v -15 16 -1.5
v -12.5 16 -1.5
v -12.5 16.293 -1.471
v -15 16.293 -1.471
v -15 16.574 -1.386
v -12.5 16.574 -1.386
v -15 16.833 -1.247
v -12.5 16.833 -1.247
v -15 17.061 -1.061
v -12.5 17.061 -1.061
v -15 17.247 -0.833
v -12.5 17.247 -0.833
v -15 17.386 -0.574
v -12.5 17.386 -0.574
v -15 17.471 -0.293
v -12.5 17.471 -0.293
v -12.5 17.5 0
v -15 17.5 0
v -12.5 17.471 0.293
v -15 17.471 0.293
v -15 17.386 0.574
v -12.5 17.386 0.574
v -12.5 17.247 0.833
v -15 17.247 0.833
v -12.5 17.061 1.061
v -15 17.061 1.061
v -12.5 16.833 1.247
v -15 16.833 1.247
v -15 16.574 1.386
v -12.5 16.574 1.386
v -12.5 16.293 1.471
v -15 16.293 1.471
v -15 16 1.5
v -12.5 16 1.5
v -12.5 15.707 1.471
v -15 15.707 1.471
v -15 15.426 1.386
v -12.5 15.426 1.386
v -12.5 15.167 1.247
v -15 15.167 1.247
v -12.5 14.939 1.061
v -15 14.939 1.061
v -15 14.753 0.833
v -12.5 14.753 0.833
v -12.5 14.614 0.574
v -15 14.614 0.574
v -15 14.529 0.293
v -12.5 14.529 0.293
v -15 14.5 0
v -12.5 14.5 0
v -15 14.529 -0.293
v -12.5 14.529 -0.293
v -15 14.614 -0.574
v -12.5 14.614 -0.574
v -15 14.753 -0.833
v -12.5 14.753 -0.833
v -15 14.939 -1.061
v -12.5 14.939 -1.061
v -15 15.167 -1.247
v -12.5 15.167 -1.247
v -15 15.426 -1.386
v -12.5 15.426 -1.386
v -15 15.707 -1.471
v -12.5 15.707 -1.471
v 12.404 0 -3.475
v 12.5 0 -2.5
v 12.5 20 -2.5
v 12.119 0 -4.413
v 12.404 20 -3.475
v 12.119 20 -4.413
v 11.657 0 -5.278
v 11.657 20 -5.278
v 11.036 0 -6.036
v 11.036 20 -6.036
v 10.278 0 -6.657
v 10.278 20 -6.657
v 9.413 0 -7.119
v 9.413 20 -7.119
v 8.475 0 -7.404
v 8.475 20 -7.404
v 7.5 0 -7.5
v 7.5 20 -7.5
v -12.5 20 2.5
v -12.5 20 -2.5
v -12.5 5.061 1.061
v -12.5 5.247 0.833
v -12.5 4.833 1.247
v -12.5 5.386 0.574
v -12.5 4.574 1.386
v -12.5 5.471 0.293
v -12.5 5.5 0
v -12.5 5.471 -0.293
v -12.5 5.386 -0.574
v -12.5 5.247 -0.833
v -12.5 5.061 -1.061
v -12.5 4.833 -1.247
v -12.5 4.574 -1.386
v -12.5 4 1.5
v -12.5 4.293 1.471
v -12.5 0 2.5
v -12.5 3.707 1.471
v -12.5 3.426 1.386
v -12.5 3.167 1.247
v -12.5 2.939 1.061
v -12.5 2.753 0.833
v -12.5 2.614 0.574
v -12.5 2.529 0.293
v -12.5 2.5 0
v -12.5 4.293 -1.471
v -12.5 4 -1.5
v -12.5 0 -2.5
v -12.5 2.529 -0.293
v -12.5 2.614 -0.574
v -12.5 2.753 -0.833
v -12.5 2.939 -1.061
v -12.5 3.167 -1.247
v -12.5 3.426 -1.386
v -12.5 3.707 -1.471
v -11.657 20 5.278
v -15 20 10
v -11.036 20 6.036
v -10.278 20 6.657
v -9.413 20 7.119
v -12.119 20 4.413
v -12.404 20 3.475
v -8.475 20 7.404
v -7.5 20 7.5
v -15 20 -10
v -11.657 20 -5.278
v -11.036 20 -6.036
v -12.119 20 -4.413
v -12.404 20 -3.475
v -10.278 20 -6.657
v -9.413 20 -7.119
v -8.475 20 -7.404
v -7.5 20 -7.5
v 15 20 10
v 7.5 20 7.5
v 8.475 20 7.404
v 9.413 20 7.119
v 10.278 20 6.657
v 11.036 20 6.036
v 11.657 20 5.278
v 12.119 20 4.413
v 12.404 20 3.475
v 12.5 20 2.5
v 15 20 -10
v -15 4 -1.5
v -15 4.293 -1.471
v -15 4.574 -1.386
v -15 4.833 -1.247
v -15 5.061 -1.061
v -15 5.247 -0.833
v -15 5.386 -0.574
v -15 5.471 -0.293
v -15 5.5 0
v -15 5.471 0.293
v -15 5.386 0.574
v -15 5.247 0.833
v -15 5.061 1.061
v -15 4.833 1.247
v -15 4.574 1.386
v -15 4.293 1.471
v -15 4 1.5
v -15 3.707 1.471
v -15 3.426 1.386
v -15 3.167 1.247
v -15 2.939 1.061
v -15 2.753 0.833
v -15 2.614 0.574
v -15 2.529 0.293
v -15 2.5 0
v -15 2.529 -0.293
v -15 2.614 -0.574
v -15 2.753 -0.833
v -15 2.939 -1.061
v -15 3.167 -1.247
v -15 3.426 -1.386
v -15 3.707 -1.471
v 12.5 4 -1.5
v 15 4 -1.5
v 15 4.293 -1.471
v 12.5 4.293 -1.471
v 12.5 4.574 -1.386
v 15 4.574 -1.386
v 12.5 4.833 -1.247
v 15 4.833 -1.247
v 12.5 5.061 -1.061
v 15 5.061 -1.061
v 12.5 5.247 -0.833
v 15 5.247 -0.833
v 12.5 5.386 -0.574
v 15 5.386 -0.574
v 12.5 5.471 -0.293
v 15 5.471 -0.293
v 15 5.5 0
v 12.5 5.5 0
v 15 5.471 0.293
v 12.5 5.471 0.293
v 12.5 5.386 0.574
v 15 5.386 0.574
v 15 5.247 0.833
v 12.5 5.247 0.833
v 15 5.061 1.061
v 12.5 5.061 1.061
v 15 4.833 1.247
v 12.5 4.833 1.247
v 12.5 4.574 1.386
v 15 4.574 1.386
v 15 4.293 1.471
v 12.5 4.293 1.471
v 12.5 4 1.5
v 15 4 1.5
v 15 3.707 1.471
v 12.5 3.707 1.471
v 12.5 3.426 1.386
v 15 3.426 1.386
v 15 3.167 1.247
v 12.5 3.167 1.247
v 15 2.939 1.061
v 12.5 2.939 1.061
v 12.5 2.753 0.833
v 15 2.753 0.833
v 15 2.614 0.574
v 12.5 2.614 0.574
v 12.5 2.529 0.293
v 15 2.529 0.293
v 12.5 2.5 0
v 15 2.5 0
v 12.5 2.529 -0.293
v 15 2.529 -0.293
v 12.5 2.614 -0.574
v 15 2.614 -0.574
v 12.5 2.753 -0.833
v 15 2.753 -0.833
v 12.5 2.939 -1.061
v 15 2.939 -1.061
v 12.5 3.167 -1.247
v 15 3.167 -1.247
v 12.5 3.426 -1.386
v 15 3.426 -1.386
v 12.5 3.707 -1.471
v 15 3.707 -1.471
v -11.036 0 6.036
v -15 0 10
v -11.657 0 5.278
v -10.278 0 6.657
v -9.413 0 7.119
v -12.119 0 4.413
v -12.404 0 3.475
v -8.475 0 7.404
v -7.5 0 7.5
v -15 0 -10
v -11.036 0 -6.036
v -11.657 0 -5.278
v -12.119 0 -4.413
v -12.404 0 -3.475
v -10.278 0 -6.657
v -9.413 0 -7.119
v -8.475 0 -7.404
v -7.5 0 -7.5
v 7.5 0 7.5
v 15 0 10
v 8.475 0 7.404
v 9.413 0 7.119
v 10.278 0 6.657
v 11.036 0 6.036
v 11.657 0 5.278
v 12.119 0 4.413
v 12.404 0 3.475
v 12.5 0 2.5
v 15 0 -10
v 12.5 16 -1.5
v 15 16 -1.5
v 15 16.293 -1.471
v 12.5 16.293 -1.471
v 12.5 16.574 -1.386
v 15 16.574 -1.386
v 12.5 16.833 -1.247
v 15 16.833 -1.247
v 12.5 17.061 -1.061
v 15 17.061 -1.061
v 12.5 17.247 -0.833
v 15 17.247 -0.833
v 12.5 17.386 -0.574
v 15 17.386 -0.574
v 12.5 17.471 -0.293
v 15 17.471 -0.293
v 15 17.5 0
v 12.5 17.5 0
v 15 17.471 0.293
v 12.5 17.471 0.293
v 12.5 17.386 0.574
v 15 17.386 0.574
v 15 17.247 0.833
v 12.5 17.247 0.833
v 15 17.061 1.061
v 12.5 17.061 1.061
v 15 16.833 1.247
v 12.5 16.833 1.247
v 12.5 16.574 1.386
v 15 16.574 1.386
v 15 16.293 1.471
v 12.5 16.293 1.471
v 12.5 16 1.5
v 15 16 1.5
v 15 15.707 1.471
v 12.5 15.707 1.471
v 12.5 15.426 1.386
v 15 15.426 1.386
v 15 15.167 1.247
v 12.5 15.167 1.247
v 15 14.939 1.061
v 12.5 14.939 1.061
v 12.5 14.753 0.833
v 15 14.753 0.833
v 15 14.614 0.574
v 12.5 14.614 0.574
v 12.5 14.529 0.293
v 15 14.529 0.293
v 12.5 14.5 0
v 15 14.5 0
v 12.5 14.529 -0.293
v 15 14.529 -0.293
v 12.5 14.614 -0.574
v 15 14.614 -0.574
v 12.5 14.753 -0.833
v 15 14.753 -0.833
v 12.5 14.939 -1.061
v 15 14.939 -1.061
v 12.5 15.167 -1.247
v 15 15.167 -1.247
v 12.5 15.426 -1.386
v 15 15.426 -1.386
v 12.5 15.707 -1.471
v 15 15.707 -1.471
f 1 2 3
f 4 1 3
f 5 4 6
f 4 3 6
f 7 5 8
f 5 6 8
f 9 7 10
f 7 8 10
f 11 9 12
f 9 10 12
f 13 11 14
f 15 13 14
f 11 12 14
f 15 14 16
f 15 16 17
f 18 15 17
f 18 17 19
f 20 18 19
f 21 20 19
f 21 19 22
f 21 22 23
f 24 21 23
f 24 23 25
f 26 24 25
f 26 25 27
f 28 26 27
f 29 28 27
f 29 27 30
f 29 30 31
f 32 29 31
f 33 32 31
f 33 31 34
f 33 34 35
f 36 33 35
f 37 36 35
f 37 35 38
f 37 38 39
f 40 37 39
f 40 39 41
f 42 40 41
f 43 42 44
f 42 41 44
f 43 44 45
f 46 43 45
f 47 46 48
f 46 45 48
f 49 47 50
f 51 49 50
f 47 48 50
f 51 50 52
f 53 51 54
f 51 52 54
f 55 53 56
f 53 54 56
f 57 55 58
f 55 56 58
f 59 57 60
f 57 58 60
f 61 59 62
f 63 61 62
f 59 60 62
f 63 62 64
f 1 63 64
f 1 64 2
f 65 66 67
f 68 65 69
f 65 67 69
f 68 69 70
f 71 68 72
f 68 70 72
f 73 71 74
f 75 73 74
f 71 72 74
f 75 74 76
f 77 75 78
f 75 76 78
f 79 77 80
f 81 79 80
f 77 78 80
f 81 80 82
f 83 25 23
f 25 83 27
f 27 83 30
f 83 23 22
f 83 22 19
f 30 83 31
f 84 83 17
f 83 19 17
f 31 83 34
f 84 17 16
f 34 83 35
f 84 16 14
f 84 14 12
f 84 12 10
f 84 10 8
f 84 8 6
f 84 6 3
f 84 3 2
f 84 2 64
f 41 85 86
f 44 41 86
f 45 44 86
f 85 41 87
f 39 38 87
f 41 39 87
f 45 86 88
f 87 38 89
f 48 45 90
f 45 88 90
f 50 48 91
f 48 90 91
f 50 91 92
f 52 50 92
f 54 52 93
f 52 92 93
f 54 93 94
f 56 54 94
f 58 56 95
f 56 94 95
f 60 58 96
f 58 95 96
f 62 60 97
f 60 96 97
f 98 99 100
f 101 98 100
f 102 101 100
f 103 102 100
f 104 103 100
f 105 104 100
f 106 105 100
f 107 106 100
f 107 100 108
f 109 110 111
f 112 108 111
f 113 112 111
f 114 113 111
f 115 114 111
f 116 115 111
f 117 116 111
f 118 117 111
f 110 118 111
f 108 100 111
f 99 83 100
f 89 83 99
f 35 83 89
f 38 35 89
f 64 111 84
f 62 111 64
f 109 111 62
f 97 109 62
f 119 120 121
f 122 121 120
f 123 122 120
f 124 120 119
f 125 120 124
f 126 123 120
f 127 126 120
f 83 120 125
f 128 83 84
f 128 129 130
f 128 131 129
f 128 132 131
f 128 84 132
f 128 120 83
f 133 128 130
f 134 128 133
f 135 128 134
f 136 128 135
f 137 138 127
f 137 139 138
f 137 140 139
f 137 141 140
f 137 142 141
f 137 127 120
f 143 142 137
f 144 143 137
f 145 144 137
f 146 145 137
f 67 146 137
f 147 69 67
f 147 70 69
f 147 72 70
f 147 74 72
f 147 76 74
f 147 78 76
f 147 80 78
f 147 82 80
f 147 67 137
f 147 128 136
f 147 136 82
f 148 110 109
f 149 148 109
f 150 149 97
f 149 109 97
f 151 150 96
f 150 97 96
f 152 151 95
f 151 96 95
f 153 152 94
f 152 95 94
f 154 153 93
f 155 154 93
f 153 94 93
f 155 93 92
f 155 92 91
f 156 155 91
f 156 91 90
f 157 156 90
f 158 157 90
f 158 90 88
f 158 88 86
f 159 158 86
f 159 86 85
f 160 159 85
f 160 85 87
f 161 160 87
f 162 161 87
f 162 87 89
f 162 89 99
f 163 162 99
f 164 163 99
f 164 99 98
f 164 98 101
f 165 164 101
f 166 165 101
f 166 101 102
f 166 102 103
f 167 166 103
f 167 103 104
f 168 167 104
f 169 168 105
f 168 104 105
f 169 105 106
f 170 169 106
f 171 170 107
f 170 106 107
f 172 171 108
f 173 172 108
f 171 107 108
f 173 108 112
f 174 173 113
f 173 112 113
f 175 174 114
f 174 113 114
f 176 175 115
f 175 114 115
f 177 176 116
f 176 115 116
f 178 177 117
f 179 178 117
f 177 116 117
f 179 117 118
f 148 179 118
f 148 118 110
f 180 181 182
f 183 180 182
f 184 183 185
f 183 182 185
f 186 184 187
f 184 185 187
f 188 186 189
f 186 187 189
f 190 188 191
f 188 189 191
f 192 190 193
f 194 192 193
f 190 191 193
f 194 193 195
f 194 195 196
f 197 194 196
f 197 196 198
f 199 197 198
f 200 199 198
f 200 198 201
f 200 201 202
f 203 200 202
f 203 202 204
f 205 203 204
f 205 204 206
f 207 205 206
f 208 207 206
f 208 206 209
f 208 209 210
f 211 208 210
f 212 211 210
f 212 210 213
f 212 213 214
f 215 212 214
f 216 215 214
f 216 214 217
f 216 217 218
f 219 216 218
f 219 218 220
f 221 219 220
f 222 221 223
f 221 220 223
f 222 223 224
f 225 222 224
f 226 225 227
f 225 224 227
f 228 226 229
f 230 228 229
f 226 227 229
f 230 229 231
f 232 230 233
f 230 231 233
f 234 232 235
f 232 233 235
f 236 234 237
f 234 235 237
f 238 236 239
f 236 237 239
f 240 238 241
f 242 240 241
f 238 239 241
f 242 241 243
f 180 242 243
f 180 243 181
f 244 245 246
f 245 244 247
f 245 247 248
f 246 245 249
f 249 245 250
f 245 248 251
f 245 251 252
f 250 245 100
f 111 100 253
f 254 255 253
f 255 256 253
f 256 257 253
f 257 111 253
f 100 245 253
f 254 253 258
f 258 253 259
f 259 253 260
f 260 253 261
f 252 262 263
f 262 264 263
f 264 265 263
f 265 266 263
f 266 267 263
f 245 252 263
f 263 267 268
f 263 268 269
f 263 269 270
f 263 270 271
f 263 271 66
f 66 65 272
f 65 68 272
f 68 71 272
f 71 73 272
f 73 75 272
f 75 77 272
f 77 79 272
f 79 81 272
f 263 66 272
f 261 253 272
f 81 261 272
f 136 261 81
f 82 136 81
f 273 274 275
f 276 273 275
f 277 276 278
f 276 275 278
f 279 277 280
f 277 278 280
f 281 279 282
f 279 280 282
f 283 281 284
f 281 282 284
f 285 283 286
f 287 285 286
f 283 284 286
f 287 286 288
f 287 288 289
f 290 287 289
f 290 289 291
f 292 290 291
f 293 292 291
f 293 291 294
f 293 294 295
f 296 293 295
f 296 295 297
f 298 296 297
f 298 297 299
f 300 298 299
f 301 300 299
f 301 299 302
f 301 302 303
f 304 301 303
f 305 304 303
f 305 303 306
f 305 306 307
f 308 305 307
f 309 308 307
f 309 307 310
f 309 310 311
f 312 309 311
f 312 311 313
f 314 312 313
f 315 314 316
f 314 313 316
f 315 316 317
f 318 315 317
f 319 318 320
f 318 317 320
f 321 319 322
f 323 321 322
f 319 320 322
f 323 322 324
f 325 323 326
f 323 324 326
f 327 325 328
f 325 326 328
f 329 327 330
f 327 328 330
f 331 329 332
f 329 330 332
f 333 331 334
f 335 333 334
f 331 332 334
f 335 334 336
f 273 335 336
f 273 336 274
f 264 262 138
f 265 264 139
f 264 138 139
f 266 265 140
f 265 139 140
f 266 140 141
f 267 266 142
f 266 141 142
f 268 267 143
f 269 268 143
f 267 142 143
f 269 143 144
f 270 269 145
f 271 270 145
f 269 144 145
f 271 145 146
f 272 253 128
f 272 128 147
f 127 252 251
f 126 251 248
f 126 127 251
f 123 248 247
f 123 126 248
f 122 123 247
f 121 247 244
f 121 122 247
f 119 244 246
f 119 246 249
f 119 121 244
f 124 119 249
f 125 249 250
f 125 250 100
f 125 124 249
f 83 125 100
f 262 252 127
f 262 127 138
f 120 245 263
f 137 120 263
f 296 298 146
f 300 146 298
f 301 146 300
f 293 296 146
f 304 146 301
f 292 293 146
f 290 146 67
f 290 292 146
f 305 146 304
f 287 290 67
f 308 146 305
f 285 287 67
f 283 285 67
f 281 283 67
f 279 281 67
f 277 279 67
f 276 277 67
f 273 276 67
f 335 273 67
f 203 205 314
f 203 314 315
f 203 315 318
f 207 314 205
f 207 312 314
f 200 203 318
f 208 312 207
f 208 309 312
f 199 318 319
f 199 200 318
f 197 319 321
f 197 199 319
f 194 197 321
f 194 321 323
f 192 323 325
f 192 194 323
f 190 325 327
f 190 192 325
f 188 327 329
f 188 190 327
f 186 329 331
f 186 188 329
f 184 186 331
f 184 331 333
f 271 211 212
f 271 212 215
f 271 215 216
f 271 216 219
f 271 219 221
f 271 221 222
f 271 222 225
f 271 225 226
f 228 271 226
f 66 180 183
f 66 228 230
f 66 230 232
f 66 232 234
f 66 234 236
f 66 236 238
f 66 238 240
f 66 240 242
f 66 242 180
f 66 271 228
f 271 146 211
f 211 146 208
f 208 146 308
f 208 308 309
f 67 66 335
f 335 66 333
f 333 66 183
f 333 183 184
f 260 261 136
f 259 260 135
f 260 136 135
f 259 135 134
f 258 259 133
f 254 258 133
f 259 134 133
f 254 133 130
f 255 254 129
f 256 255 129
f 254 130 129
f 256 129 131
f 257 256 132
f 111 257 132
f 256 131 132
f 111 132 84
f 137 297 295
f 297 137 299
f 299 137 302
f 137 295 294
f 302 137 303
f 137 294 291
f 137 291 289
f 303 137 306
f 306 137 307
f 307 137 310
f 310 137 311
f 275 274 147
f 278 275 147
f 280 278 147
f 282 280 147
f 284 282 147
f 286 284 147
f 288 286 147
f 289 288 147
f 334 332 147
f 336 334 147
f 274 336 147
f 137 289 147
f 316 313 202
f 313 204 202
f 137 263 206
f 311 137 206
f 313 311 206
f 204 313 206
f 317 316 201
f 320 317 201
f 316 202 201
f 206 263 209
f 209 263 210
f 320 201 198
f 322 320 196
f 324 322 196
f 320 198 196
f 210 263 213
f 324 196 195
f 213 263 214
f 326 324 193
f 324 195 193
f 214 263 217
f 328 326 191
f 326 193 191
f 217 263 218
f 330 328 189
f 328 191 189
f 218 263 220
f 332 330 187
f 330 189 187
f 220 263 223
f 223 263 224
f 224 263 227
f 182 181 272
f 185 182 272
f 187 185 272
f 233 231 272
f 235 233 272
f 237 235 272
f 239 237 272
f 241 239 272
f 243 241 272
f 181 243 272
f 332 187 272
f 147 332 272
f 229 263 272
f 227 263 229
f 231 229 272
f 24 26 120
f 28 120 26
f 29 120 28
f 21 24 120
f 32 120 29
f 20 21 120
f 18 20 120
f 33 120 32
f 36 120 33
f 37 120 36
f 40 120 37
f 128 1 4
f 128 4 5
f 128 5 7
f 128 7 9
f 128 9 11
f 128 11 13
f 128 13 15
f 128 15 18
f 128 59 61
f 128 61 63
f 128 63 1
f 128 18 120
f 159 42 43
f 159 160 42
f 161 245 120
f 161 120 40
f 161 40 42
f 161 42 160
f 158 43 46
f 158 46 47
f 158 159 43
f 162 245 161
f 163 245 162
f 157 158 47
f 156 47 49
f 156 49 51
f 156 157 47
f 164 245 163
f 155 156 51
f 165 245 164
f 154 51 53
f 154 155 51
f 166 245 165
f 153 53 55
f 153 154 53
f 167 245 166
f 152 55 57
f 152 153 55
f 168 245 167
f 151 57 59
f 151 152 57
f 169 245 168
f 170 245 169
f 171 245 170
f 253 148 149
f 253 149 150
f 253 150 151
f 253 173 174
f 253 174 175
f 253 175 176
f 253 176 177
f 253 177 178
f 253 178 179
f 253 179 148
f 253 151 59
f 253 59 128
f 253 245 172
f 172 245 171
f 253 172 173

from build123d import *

# Parameters (mm, degrees)
BOSS_EXTRUDE1_OUTLINE_W   = 30
BOSS_EXTRUDE1_OUTLINE_H   = 20
BOSS_EXTRUDE1_OUTLINE_W_2 = 25
BOSS_EXTRUDE1_OUTLINE_H_2 = 15
BOSS_EXTRUDE1_DEPTH       = 20
SKETCH4_R                 = 1.5
CUT_EXTRUDE3_DEPTH        = 38.416573868
FILLET1_R                 = 5


# Read off the part's stored shape, not the designer's step: Boss-Extrude1
with BuildPart() as part:
    # Boss-Extrude1 outline → Boss-Extrude1 (new body)
    with BuildSketch(Plane(origin=(0, 0, 0), x_dir=(1, 0, 0), z_dir=(0, 1, 0))):
        Rectangle(BOSS_EXTRUDE1_OUTLINE_W, BOSS_EXTRUDE1_OUTLINE_H)
        Rectangle(BOSS_EXTRUDE1_OUTLINE_W_2, BOSS_EXTRUDE1_OUTLINE_H_2, mode=Mode.SUBTRACT)
    extrude(amount=BOSS_EXTRUDE1_DEPTH)

    # Sketch4 → Cut-Extrude3 (cut, through all)
    with BuildSketch(Plane(origin=(15, 0, 0), x_dir=(0, 0, -1), z_dir=(1, 0, 0))):
        with Locations((0, 16)):
            Circle(SKETCH4_R)
        with Locations((0, 4)):
            Circle(SKETCH4_R)
    extrude(amount=-CUT_EXTRUDE3_DEPTH, mode=Mode.SUBTRACT)

    # Fillet1
    fillet1_edges = [part.edges().sort_by_distance(p)[0] for p in [
        (12.5, 10, 7.5),
        (12.5, 10, -7.5),
        (-12.5, 10, -7.5),
        (-12.5, 10, 7.5),
    ]]
    fillet(fillet1_edges, radius=FILLET1_R)


solid = part.part
